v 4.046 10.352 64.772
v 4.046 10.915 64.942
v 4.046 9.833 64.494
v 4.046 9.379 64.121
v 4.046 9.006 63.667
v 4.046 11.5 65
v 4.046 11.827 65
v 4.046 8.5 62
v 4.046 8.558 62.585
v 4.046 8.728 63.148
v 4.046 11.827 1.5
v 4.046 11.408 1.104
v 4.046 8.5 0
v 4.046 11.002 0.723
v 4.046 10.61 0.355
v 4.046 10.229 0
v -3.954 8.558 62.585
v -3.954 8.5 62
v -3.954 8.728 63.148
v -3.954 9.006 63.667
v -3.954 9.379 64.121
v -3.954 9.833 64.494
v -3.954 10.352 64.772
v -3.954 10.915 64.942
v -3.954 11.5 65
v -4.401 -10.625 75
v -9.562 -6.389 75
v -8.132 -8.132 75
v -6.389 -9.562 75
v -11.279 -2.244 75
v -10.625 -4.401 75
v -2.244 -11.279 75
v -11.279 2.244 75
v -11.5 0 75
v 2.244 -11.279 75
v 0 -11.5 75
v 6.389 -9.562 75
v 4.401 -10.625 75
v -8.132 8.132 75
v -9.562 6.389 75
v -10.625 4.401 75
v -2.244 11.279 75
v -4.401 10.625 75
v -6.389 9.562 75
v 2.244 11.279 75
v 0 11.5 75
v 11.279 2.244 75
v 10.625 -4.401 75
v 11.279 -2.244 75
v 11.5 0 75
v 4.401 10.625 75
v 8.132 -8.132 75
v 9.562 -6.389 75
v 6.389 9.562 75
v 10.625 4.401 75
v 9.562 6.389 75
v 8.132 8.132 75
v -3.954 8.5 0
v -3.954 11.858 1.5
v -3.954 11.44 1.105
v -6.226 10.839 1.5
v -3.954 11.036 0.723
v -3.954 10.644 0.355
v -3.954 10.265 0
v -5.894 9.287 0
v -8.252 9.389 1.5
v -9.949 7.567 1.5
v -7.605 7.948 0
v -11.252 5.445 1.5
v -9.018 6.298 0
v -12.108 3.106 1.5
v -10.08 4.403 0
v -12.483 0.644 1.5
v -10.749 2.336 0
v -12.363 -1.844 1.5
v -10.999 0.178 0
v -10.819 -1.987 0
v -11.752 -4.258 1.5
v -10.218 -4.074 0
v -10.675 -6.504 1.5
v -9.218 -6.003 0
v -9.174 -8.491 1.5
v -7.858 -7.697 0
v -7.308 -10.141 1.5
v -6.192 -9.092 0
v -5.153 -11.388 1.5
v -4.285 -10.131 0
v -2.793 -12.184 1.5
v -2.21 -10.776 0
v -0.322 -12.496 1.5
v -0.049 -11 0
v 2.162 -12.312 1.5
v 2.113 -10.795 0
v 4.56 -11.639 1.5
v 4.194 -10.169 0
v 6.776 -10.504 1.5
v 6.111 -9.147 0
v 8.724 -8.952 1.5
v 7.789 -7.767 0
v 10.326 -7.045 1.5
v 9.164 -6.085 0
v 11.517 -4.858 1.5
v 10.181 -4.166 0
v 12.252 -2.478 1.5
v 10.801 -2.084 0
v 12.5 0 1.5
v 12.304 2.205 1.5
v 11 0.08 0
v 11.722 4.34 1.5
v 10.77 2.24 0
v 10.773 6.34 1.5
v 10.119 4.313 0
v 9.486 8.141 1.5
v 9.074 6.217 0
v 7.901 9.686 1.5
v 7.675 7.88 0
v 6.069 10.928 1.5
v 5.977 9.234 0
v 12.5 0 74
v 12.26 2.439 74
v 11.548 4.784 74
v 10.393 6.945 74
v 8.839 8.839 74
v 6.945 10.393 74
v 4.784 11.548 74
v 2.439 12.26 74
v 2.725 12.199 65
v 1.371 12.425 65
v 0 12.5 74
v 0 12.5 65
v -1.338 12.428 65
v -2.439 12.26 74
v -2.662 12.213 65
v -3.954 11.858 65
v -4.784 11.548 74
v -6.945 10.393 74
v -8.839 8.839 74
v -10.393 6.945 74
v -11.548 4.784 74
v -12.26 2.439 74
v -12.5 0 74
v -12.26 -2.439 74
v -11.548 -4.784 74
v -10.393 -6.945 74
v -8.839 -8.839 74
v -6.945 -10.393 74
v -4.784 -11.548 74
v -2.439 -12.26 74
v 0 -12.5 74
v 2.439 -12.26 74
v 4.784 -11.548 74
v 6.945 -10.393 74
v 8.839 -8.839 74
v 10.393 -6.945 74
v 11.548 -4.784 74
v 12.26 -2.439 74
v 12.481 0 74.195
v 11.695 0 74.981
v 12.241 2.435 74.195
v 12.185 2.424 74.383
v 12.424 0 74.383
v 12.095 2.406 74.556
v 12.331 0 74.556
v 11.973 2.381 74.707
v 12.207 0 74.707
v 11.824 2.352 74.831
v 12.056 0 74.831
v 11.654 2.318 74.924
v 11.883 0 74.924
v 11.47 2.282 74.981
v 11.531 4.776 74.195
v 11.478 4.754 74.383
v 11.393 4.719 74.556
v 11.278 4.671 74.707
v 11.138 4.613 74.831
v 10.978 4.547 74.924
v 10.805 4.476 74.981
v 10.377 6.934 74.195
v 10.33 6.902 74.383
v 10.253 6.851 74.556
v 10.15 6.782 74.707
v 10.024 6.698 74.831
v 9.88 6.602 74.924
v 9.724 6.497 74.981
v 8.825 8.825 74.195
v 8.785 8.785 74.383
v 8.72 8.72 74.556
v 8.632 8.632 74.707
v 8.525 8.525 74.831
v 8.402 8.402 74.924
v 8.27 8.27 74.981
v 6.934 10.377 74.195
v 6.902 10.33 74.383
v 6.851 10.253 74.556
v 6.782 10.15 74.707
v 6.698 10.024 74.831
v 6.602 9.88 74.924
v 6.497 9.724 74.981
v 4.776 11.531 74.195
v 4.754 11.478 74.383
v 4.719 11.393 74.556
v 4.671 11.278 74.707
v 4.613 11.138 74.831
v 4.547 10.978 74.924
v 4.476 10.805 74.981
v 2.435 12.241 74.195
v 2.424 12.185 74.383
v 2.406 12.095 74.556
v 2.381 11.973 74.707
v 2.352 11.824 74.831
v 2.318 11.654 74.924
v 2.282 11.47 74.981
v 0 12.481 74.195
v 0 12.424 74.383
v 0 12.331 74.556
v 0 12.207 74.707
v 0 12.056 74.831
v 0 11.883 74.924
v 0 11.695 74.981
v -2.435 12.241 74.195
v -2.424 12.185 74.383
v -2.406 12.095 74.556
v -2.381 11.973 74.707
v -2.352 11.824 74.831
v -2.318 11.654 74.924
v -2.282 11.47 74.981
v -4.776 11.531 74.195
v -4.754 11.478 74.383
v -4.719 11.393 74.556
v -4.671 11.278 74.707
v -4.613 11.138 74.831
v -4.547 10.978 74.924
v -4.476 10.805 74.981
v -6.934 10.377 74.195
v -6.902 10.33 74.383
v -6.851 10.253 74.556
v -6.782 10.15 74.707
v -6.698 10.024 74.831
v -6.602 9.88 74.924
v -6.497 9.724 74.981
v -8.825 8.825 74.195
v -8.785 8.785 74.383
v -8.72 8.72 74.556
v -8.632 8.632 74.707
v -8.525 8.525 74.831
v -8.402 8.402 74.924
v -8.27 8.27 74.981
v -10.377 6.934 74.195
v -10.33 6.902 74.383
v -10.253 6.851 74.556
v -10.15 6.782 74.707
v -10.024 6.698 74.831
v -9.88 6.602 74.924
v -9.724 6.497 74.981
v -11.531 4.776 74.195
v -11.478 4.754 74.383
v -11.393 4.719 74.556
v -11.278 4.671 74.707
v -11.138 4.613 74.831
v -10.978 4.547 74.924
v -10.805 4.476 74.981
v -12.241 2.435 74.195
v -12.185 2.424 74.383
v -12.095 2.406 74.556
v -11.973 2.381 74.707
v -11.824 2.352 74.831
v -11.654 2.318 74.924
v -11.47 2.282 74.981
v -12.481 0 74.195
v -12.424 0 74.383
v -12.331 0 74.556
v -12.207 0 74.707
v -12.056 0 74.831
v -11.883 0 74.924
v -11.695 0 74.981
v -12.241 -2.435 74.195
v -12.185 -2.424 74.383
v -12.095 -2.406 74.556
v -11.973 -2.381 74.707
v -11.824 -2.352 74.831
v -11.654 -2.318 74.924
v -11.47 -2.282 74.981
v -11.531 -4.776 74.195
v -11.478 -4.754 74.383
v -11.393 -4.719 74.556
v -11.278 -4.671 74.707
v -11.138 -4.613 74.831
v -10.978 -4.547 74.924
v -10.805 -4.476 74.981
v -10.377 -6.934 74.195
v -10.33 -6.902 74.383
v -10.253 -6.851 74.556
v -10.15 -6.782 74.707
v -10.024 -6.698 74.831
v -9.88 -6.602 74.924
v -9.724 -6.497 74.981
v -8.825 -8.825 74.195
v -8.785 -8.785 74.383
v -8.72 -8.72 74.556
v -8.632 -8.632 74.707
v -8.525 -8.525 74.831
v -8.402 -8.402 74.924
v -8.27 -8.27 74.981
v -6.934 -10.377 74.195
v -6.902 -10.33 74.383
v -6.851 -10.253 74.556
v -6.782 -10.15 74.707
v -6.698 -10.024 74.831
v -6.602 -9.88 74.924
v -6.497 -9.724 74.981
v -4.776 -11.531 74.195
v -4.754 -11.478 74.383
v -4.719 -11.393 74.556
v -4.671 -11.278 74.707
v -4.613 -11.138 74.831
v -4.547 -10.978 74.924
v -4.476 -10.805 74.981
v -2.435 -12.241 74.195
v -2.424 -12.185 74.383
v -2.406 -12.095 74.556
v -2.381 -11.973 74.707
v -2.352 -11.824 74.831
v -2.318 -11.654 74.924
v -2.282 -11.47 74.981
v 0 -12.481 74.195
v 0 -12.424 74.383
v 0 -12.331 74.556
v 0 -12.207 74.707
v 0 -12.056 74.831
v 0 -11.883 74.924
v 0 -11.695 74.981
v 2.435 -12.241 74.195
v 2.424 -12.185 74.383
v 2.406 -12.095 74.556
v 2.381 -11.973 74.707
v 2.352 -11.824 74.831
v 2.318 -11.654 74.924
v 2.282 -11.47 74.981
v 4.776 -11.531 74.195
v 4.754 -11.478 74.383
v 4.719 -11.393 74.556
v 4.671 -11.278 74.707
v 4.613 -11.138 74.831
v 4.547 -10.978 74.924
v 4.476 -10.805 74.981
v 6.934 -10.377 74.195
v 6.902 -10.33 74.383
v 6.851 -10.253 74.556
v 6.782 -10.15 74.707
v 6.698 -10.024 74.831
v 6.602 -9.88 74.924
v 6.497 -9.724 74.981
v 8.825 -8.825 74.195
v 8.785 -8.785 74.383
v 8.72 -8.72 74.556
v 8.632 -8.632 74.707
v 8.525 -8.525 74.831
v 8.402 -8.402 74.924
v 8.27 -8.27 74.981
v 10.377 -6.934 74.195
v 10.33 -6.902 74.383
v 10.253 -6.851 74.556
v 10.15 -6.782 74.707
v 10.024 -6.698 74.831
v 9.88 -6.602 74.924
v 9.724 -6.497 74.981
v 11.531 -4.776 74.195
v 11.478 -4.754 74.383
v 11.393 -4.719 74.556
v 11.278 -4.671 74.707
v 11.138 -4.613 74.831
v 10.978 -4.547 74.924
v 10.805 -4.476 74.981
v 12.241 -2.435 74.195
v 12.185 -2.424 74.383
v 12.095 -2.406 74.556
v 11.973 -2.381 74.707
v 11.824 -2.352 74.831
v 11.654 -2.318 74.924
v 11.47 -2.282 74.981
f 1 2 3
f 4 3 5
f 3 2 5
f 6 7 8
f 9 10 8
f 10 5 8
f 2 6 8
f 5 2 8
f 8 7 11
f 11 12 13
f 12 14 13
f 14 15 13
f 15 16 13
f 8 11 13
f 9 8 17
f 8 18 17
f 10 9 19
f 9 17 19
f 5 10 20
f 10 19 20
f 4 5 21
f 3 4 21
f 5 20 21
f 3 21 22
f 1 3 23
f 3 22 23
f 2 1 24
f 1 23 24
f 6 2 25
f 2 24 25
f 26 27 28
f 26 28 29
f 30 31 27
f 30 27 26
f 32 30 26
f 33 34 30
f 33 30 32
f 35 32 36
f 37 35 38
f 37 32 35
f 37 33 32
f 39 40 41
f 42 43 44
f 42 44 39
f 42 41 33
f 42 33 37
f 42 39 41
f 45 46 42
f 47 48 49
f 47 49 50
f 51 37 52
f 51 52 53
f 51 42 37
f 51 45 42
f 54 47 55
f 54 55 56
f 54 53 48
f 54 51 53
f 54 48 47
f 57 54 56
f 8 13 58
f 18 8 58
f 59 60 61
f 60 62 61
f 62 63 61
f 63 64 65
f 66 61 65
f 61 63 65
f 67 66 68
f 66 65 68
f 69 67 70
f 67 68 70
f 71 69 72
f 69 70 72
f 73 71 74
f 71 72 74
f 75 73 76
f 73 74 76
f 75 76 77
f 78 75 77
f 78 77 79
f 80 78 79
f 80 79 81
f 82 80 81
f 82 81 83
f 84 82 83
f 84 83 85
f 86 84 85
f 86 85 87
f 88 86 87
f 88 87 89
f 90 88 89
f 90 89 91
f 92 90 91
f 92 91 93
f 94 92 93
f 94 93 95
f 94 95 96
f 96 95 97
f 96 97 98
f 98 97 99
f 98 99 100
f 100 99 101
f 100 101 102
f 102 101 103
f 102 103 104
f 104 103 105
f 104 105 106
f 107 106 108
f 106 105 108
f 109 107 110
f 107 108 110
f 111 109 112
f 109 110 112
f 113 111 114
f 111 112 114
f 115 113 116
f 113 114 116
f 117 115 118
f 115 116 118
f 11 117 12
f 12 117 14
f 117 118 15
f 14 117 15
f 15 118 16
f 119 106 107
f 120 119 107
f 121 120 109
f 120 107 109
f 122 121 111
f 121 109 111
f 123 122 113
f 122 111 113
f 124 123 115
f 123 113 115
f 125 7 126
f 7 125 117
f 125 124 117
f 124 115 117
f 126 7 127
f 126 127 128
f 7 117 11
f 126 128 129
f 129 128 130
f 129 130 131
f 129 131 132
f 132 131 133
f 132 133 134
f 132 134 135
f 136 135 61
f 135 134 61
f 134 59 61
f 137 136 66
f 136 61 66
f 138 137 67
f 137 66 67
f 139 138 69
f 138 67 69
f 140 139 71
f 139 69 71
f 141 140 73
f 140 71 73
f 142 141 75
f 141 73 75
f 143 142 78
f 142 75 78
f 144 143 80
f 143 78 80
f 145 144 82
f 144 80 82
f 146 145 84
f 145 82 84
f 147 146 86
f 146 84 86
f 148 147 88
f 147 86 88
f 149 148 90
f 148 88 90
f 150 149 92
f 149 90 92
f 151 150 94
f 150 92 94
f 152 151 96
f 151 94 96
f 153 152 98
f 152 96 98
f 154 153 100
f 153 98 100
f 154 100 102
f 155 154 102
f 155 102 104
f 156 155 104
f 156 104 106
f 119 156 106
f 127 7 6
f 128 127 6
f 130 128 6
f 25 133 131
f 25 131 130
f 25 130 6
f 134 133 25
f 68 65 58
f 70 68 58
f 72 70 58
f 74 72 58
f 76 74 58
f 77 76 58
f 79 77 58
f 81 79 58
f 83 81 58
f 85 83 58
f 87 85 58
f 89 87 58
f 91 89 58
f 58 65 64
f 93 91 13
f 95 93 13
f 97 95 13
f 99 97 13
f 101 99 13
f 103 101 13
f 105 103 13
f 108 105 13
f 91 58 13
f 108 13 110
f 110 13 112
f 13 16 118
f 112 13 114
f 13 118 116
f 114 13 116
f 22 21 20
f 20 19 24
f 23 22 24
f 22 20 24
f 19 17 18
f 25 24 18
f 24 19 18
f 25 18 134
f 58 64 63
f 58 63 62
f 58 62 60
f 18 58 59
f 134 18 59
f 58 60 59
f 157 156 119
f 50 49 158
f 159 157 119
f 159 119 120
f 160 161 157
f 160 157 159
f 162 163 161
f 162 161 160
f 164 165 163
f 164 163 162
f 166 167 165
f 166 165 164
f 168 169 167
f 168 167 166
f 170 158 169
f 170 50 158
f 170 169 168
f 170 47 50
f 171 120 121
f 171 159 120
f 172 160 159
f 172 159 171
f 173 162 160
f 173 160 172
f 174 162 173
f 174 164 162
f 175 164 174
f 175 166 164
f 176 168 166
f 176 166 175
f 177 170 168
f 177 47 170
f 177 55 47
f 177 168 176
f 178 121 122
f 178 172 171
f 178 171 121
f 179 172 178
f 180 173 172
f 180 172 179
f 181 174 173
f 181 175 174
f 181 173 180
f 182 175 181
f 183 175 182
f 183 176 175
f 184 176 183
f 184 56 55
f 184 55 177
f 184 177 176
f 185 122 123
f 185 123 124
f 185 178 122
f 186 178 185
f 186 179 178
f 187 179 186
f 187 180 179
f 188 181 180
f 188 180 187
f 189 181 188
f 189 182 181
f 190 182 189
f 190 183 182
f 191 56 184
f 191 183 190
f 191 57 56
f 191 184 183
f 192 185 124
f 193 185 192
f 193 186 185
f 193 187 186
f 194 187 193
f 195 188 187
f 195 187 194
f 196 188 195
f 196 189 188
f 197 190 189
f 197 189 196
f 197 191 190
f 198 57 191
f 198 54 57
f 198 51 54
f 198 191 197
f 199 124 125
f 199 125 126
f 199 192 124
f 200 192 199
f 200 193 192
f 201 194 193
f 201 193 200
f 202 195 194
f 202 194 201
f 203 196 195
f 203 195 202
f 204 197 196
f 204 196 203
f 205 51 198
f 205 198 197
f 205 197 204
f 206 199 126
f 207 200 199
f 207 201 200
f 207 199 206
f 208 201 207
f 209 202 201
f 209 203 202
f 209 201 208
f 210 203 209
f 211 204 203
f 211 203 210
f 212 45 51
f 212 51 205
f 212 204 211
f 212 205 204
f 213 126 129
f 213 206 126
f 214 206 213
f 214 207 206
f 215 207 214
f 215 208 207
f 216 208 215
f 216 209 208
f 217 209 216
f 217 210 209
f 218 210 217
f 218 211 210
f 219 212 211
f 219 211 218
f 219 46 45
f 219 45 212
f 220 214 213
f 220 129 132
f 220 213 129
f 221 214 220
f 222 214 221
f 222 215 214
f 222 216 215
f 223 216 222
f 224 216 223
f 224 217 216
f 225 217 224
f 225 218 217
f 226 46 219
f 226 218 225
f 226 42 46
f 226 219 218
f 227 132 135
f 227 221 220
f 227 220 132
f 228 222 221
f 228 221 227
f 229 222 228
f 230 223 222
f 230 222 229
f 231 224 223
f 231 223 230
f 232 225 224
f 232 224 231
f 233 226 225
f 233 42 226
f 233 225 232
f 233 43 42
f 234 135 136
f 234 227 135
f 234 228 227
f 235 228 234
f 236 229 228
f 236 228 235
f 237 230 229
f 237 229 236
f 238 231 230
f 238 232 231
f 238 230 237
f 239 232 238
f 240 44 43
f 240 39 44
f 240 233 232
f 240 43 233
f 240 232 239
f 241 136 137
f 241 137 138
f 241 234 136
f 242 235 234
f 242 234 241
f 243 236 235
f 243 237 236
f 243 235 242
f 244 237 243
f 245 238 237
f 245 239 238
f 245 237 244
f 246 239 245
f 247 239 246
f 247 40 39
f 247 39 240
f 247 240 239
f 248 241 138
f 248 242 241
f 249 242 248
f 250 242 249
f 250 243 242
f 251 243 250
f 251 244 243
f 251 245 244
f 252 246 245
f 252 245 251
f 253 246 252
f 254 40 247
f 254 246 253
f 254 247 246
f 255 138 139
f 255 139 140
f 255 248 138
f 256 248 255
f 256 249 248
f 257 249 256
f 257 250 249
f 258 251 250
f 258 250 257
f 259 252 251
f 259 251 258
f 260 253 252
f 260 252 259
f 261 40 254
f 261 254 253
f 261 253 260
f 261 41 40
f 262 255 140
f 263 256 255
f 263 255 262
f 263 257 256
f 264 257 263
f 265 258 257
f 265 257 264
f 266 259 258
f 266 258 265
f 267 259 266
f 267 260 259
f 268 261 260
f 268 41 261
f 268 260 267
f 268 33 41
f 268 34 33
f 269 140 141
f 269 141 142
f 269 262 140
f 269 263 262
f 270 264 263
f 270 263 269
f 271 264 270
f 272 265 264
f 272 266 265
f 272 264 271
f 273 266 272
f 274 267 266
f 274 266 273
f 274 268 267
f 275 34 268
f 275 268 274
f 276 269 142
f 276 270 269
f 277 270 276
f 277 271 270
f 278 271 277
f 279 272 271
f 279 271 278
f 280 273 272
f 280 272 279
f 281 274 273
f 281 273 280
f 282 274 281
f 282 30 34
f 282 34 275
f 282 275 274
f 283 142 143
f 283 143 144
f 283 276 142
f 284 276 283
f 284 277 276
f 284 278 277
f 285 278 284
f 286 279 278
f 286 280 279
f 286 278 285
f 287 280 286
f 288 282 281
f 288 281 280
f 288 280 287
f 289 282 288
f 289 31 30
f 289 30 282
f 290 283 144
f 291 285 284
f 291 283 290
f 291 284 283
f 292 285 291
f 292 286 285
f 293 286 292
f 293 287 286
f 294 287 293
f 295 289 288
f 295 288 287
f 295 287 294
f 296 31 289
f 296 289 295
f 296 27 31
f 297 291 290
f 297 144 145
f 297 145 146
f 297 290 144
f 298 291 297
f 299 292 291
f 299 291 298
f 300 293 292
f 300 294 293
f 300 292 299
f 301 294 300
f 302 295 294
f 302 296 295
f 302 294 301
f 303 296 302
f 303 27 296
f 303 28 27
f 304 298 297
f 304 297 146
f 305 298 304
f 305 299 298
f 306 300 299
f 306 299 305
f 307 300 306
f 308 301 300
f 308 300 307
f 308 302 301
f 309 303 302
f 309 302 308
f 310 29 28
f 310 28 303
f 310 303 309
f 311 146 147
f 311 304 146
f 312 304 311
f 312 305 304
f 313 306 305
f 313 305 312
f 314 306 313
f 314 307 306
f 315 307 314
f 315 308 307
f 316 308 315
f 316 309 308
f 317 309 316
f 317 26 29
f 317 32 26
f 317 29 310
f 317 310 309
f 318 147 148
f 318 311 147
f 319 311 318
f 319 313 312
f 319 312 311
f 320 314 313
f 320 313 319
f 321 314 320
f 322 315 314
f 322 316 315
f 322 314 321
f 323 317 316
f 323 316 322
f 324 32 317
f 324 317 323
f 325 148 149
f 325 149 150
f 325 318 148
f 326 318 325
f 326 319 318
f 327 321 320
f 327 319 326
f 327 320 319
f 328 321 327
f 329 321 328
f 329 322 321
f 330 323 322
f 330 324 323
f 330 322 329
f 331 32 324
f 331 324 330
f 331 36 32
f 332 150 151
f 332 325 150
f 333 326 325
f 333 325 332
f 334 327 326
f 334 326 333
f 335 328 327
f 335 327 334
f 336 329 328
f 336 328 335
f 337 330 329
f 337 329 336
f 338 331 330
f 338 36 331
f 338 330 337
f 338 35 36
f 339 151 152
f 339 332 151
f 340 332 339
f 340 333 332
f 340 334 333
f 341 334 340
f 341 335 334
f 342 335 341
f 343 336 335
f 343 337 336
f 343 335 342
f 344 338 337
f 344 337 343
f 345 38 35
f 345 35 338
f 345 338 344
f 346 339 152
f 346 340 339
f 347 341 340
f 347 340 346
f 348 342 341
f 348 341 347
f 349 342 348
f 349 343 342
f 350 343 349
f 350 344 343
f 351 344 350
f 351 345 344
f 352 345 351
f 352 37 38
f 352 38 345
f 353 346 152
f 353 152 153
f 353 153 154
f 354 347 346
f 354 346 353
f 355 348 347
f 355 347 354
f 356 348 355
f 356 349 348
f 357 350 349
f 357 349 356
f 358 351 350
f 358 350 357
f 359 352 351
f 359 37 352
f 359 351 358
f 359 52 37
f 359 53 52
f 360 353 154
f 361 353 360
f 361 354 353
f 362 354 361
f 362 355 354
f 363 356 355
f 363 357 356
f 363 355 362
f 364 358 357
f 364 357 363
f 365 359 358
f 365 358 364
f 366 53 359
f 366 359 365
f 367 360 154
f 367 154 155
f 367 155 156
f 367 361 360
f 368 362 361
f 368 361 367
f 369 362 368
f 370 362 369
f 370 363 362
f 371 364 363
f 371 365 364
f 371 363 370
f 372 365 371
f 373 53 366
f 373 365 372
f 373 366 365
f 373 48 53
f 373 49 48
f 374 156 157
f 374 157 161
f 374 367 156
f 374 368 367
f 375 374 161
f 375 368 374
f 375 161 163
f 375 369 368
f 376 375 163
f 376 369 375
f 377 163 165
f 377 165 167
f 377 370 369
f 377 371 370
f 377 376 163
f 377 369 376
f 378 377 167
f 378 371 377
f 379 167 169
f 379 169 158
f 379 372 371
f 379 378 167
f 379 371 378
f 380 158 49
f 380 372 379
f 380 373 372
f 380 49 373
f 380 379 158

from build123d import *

# Parameters (mm, degrees)
SKETCH1_R           = 12.5
BOSS_EXTRUDE1_DEPTH = 75
CUT_EXTRUDE1_DEPTH  = 65
CHAMFER1_SIZE       = 1.5
FILLET1_R           = 3
FILLET2_R           = 1


with BuildPart() as part:
    # Sketch1 → Boss-Extrude1 (new body)
    with BuildSketch(Plane.XY):
        Circle(SKETCH1_R)
    extrude(amount=BOSS_EXTRUDE1_DEPTH)

    # Sketch2 → Cut-Extrude1 (cut)
    with BuildSketch(Plane(origin=(0, 0, 0), x_dir=(-1, 0, 0), z_dir=(0, 0, -1))):
        with BuildLine():
            Line((-4.045894985, 8.5), (0, 8.5))
            Line((0, 8.5), (0, 12.5))
            ThreePointArc((0, 12.5), (-2.050733749, 12.330632226), (-4.045894985, 11.827118574))
            Line((-4.045894985, 11.827118574), (-4.045894985, 8.5))
        make_face()
        with BuildLine():
            Line((0, 12.5), (0, 8.5))
            Line((0, 8.5), (3.954105015, 8.5))
            Line((3.954105015, 8.5), (3.954105015, 11.858121838))
            ThreePointArc((3.954105015, 11.858121838), (2.002932478, 12.338487002), (0, 12.5))
        make_face()
    extrude(amount=-CUT_EXTRUDE1_DEPTH, mode=Mode.SUBTRACT)

    # Chamfer1
    chamfer1_edges = [part.edges().sort_by_distance(p)[0] for p in [
        (-7.308340691, -10.140914966, 0),
    ]]
    chamfer(chamfer1_edges, length=CHAMFER1_SIZE)

    # Fillet1
    fillet1_edges = [part.edges().sort_by_distance(p)[0] for p in [
        (0.045894985, 8.5, 65),
    ]]
    fillet(fillet1_edges, radius=FILLET1_R)

    # Fillet2
    fillet2_edges = [part.edges().sort_by_distance(p)[0] for p in [
        (-12.5, 0, 75),
    ]]
    fillet(fillet2_edges, radius=FILLET2_R)


solid = part.part
